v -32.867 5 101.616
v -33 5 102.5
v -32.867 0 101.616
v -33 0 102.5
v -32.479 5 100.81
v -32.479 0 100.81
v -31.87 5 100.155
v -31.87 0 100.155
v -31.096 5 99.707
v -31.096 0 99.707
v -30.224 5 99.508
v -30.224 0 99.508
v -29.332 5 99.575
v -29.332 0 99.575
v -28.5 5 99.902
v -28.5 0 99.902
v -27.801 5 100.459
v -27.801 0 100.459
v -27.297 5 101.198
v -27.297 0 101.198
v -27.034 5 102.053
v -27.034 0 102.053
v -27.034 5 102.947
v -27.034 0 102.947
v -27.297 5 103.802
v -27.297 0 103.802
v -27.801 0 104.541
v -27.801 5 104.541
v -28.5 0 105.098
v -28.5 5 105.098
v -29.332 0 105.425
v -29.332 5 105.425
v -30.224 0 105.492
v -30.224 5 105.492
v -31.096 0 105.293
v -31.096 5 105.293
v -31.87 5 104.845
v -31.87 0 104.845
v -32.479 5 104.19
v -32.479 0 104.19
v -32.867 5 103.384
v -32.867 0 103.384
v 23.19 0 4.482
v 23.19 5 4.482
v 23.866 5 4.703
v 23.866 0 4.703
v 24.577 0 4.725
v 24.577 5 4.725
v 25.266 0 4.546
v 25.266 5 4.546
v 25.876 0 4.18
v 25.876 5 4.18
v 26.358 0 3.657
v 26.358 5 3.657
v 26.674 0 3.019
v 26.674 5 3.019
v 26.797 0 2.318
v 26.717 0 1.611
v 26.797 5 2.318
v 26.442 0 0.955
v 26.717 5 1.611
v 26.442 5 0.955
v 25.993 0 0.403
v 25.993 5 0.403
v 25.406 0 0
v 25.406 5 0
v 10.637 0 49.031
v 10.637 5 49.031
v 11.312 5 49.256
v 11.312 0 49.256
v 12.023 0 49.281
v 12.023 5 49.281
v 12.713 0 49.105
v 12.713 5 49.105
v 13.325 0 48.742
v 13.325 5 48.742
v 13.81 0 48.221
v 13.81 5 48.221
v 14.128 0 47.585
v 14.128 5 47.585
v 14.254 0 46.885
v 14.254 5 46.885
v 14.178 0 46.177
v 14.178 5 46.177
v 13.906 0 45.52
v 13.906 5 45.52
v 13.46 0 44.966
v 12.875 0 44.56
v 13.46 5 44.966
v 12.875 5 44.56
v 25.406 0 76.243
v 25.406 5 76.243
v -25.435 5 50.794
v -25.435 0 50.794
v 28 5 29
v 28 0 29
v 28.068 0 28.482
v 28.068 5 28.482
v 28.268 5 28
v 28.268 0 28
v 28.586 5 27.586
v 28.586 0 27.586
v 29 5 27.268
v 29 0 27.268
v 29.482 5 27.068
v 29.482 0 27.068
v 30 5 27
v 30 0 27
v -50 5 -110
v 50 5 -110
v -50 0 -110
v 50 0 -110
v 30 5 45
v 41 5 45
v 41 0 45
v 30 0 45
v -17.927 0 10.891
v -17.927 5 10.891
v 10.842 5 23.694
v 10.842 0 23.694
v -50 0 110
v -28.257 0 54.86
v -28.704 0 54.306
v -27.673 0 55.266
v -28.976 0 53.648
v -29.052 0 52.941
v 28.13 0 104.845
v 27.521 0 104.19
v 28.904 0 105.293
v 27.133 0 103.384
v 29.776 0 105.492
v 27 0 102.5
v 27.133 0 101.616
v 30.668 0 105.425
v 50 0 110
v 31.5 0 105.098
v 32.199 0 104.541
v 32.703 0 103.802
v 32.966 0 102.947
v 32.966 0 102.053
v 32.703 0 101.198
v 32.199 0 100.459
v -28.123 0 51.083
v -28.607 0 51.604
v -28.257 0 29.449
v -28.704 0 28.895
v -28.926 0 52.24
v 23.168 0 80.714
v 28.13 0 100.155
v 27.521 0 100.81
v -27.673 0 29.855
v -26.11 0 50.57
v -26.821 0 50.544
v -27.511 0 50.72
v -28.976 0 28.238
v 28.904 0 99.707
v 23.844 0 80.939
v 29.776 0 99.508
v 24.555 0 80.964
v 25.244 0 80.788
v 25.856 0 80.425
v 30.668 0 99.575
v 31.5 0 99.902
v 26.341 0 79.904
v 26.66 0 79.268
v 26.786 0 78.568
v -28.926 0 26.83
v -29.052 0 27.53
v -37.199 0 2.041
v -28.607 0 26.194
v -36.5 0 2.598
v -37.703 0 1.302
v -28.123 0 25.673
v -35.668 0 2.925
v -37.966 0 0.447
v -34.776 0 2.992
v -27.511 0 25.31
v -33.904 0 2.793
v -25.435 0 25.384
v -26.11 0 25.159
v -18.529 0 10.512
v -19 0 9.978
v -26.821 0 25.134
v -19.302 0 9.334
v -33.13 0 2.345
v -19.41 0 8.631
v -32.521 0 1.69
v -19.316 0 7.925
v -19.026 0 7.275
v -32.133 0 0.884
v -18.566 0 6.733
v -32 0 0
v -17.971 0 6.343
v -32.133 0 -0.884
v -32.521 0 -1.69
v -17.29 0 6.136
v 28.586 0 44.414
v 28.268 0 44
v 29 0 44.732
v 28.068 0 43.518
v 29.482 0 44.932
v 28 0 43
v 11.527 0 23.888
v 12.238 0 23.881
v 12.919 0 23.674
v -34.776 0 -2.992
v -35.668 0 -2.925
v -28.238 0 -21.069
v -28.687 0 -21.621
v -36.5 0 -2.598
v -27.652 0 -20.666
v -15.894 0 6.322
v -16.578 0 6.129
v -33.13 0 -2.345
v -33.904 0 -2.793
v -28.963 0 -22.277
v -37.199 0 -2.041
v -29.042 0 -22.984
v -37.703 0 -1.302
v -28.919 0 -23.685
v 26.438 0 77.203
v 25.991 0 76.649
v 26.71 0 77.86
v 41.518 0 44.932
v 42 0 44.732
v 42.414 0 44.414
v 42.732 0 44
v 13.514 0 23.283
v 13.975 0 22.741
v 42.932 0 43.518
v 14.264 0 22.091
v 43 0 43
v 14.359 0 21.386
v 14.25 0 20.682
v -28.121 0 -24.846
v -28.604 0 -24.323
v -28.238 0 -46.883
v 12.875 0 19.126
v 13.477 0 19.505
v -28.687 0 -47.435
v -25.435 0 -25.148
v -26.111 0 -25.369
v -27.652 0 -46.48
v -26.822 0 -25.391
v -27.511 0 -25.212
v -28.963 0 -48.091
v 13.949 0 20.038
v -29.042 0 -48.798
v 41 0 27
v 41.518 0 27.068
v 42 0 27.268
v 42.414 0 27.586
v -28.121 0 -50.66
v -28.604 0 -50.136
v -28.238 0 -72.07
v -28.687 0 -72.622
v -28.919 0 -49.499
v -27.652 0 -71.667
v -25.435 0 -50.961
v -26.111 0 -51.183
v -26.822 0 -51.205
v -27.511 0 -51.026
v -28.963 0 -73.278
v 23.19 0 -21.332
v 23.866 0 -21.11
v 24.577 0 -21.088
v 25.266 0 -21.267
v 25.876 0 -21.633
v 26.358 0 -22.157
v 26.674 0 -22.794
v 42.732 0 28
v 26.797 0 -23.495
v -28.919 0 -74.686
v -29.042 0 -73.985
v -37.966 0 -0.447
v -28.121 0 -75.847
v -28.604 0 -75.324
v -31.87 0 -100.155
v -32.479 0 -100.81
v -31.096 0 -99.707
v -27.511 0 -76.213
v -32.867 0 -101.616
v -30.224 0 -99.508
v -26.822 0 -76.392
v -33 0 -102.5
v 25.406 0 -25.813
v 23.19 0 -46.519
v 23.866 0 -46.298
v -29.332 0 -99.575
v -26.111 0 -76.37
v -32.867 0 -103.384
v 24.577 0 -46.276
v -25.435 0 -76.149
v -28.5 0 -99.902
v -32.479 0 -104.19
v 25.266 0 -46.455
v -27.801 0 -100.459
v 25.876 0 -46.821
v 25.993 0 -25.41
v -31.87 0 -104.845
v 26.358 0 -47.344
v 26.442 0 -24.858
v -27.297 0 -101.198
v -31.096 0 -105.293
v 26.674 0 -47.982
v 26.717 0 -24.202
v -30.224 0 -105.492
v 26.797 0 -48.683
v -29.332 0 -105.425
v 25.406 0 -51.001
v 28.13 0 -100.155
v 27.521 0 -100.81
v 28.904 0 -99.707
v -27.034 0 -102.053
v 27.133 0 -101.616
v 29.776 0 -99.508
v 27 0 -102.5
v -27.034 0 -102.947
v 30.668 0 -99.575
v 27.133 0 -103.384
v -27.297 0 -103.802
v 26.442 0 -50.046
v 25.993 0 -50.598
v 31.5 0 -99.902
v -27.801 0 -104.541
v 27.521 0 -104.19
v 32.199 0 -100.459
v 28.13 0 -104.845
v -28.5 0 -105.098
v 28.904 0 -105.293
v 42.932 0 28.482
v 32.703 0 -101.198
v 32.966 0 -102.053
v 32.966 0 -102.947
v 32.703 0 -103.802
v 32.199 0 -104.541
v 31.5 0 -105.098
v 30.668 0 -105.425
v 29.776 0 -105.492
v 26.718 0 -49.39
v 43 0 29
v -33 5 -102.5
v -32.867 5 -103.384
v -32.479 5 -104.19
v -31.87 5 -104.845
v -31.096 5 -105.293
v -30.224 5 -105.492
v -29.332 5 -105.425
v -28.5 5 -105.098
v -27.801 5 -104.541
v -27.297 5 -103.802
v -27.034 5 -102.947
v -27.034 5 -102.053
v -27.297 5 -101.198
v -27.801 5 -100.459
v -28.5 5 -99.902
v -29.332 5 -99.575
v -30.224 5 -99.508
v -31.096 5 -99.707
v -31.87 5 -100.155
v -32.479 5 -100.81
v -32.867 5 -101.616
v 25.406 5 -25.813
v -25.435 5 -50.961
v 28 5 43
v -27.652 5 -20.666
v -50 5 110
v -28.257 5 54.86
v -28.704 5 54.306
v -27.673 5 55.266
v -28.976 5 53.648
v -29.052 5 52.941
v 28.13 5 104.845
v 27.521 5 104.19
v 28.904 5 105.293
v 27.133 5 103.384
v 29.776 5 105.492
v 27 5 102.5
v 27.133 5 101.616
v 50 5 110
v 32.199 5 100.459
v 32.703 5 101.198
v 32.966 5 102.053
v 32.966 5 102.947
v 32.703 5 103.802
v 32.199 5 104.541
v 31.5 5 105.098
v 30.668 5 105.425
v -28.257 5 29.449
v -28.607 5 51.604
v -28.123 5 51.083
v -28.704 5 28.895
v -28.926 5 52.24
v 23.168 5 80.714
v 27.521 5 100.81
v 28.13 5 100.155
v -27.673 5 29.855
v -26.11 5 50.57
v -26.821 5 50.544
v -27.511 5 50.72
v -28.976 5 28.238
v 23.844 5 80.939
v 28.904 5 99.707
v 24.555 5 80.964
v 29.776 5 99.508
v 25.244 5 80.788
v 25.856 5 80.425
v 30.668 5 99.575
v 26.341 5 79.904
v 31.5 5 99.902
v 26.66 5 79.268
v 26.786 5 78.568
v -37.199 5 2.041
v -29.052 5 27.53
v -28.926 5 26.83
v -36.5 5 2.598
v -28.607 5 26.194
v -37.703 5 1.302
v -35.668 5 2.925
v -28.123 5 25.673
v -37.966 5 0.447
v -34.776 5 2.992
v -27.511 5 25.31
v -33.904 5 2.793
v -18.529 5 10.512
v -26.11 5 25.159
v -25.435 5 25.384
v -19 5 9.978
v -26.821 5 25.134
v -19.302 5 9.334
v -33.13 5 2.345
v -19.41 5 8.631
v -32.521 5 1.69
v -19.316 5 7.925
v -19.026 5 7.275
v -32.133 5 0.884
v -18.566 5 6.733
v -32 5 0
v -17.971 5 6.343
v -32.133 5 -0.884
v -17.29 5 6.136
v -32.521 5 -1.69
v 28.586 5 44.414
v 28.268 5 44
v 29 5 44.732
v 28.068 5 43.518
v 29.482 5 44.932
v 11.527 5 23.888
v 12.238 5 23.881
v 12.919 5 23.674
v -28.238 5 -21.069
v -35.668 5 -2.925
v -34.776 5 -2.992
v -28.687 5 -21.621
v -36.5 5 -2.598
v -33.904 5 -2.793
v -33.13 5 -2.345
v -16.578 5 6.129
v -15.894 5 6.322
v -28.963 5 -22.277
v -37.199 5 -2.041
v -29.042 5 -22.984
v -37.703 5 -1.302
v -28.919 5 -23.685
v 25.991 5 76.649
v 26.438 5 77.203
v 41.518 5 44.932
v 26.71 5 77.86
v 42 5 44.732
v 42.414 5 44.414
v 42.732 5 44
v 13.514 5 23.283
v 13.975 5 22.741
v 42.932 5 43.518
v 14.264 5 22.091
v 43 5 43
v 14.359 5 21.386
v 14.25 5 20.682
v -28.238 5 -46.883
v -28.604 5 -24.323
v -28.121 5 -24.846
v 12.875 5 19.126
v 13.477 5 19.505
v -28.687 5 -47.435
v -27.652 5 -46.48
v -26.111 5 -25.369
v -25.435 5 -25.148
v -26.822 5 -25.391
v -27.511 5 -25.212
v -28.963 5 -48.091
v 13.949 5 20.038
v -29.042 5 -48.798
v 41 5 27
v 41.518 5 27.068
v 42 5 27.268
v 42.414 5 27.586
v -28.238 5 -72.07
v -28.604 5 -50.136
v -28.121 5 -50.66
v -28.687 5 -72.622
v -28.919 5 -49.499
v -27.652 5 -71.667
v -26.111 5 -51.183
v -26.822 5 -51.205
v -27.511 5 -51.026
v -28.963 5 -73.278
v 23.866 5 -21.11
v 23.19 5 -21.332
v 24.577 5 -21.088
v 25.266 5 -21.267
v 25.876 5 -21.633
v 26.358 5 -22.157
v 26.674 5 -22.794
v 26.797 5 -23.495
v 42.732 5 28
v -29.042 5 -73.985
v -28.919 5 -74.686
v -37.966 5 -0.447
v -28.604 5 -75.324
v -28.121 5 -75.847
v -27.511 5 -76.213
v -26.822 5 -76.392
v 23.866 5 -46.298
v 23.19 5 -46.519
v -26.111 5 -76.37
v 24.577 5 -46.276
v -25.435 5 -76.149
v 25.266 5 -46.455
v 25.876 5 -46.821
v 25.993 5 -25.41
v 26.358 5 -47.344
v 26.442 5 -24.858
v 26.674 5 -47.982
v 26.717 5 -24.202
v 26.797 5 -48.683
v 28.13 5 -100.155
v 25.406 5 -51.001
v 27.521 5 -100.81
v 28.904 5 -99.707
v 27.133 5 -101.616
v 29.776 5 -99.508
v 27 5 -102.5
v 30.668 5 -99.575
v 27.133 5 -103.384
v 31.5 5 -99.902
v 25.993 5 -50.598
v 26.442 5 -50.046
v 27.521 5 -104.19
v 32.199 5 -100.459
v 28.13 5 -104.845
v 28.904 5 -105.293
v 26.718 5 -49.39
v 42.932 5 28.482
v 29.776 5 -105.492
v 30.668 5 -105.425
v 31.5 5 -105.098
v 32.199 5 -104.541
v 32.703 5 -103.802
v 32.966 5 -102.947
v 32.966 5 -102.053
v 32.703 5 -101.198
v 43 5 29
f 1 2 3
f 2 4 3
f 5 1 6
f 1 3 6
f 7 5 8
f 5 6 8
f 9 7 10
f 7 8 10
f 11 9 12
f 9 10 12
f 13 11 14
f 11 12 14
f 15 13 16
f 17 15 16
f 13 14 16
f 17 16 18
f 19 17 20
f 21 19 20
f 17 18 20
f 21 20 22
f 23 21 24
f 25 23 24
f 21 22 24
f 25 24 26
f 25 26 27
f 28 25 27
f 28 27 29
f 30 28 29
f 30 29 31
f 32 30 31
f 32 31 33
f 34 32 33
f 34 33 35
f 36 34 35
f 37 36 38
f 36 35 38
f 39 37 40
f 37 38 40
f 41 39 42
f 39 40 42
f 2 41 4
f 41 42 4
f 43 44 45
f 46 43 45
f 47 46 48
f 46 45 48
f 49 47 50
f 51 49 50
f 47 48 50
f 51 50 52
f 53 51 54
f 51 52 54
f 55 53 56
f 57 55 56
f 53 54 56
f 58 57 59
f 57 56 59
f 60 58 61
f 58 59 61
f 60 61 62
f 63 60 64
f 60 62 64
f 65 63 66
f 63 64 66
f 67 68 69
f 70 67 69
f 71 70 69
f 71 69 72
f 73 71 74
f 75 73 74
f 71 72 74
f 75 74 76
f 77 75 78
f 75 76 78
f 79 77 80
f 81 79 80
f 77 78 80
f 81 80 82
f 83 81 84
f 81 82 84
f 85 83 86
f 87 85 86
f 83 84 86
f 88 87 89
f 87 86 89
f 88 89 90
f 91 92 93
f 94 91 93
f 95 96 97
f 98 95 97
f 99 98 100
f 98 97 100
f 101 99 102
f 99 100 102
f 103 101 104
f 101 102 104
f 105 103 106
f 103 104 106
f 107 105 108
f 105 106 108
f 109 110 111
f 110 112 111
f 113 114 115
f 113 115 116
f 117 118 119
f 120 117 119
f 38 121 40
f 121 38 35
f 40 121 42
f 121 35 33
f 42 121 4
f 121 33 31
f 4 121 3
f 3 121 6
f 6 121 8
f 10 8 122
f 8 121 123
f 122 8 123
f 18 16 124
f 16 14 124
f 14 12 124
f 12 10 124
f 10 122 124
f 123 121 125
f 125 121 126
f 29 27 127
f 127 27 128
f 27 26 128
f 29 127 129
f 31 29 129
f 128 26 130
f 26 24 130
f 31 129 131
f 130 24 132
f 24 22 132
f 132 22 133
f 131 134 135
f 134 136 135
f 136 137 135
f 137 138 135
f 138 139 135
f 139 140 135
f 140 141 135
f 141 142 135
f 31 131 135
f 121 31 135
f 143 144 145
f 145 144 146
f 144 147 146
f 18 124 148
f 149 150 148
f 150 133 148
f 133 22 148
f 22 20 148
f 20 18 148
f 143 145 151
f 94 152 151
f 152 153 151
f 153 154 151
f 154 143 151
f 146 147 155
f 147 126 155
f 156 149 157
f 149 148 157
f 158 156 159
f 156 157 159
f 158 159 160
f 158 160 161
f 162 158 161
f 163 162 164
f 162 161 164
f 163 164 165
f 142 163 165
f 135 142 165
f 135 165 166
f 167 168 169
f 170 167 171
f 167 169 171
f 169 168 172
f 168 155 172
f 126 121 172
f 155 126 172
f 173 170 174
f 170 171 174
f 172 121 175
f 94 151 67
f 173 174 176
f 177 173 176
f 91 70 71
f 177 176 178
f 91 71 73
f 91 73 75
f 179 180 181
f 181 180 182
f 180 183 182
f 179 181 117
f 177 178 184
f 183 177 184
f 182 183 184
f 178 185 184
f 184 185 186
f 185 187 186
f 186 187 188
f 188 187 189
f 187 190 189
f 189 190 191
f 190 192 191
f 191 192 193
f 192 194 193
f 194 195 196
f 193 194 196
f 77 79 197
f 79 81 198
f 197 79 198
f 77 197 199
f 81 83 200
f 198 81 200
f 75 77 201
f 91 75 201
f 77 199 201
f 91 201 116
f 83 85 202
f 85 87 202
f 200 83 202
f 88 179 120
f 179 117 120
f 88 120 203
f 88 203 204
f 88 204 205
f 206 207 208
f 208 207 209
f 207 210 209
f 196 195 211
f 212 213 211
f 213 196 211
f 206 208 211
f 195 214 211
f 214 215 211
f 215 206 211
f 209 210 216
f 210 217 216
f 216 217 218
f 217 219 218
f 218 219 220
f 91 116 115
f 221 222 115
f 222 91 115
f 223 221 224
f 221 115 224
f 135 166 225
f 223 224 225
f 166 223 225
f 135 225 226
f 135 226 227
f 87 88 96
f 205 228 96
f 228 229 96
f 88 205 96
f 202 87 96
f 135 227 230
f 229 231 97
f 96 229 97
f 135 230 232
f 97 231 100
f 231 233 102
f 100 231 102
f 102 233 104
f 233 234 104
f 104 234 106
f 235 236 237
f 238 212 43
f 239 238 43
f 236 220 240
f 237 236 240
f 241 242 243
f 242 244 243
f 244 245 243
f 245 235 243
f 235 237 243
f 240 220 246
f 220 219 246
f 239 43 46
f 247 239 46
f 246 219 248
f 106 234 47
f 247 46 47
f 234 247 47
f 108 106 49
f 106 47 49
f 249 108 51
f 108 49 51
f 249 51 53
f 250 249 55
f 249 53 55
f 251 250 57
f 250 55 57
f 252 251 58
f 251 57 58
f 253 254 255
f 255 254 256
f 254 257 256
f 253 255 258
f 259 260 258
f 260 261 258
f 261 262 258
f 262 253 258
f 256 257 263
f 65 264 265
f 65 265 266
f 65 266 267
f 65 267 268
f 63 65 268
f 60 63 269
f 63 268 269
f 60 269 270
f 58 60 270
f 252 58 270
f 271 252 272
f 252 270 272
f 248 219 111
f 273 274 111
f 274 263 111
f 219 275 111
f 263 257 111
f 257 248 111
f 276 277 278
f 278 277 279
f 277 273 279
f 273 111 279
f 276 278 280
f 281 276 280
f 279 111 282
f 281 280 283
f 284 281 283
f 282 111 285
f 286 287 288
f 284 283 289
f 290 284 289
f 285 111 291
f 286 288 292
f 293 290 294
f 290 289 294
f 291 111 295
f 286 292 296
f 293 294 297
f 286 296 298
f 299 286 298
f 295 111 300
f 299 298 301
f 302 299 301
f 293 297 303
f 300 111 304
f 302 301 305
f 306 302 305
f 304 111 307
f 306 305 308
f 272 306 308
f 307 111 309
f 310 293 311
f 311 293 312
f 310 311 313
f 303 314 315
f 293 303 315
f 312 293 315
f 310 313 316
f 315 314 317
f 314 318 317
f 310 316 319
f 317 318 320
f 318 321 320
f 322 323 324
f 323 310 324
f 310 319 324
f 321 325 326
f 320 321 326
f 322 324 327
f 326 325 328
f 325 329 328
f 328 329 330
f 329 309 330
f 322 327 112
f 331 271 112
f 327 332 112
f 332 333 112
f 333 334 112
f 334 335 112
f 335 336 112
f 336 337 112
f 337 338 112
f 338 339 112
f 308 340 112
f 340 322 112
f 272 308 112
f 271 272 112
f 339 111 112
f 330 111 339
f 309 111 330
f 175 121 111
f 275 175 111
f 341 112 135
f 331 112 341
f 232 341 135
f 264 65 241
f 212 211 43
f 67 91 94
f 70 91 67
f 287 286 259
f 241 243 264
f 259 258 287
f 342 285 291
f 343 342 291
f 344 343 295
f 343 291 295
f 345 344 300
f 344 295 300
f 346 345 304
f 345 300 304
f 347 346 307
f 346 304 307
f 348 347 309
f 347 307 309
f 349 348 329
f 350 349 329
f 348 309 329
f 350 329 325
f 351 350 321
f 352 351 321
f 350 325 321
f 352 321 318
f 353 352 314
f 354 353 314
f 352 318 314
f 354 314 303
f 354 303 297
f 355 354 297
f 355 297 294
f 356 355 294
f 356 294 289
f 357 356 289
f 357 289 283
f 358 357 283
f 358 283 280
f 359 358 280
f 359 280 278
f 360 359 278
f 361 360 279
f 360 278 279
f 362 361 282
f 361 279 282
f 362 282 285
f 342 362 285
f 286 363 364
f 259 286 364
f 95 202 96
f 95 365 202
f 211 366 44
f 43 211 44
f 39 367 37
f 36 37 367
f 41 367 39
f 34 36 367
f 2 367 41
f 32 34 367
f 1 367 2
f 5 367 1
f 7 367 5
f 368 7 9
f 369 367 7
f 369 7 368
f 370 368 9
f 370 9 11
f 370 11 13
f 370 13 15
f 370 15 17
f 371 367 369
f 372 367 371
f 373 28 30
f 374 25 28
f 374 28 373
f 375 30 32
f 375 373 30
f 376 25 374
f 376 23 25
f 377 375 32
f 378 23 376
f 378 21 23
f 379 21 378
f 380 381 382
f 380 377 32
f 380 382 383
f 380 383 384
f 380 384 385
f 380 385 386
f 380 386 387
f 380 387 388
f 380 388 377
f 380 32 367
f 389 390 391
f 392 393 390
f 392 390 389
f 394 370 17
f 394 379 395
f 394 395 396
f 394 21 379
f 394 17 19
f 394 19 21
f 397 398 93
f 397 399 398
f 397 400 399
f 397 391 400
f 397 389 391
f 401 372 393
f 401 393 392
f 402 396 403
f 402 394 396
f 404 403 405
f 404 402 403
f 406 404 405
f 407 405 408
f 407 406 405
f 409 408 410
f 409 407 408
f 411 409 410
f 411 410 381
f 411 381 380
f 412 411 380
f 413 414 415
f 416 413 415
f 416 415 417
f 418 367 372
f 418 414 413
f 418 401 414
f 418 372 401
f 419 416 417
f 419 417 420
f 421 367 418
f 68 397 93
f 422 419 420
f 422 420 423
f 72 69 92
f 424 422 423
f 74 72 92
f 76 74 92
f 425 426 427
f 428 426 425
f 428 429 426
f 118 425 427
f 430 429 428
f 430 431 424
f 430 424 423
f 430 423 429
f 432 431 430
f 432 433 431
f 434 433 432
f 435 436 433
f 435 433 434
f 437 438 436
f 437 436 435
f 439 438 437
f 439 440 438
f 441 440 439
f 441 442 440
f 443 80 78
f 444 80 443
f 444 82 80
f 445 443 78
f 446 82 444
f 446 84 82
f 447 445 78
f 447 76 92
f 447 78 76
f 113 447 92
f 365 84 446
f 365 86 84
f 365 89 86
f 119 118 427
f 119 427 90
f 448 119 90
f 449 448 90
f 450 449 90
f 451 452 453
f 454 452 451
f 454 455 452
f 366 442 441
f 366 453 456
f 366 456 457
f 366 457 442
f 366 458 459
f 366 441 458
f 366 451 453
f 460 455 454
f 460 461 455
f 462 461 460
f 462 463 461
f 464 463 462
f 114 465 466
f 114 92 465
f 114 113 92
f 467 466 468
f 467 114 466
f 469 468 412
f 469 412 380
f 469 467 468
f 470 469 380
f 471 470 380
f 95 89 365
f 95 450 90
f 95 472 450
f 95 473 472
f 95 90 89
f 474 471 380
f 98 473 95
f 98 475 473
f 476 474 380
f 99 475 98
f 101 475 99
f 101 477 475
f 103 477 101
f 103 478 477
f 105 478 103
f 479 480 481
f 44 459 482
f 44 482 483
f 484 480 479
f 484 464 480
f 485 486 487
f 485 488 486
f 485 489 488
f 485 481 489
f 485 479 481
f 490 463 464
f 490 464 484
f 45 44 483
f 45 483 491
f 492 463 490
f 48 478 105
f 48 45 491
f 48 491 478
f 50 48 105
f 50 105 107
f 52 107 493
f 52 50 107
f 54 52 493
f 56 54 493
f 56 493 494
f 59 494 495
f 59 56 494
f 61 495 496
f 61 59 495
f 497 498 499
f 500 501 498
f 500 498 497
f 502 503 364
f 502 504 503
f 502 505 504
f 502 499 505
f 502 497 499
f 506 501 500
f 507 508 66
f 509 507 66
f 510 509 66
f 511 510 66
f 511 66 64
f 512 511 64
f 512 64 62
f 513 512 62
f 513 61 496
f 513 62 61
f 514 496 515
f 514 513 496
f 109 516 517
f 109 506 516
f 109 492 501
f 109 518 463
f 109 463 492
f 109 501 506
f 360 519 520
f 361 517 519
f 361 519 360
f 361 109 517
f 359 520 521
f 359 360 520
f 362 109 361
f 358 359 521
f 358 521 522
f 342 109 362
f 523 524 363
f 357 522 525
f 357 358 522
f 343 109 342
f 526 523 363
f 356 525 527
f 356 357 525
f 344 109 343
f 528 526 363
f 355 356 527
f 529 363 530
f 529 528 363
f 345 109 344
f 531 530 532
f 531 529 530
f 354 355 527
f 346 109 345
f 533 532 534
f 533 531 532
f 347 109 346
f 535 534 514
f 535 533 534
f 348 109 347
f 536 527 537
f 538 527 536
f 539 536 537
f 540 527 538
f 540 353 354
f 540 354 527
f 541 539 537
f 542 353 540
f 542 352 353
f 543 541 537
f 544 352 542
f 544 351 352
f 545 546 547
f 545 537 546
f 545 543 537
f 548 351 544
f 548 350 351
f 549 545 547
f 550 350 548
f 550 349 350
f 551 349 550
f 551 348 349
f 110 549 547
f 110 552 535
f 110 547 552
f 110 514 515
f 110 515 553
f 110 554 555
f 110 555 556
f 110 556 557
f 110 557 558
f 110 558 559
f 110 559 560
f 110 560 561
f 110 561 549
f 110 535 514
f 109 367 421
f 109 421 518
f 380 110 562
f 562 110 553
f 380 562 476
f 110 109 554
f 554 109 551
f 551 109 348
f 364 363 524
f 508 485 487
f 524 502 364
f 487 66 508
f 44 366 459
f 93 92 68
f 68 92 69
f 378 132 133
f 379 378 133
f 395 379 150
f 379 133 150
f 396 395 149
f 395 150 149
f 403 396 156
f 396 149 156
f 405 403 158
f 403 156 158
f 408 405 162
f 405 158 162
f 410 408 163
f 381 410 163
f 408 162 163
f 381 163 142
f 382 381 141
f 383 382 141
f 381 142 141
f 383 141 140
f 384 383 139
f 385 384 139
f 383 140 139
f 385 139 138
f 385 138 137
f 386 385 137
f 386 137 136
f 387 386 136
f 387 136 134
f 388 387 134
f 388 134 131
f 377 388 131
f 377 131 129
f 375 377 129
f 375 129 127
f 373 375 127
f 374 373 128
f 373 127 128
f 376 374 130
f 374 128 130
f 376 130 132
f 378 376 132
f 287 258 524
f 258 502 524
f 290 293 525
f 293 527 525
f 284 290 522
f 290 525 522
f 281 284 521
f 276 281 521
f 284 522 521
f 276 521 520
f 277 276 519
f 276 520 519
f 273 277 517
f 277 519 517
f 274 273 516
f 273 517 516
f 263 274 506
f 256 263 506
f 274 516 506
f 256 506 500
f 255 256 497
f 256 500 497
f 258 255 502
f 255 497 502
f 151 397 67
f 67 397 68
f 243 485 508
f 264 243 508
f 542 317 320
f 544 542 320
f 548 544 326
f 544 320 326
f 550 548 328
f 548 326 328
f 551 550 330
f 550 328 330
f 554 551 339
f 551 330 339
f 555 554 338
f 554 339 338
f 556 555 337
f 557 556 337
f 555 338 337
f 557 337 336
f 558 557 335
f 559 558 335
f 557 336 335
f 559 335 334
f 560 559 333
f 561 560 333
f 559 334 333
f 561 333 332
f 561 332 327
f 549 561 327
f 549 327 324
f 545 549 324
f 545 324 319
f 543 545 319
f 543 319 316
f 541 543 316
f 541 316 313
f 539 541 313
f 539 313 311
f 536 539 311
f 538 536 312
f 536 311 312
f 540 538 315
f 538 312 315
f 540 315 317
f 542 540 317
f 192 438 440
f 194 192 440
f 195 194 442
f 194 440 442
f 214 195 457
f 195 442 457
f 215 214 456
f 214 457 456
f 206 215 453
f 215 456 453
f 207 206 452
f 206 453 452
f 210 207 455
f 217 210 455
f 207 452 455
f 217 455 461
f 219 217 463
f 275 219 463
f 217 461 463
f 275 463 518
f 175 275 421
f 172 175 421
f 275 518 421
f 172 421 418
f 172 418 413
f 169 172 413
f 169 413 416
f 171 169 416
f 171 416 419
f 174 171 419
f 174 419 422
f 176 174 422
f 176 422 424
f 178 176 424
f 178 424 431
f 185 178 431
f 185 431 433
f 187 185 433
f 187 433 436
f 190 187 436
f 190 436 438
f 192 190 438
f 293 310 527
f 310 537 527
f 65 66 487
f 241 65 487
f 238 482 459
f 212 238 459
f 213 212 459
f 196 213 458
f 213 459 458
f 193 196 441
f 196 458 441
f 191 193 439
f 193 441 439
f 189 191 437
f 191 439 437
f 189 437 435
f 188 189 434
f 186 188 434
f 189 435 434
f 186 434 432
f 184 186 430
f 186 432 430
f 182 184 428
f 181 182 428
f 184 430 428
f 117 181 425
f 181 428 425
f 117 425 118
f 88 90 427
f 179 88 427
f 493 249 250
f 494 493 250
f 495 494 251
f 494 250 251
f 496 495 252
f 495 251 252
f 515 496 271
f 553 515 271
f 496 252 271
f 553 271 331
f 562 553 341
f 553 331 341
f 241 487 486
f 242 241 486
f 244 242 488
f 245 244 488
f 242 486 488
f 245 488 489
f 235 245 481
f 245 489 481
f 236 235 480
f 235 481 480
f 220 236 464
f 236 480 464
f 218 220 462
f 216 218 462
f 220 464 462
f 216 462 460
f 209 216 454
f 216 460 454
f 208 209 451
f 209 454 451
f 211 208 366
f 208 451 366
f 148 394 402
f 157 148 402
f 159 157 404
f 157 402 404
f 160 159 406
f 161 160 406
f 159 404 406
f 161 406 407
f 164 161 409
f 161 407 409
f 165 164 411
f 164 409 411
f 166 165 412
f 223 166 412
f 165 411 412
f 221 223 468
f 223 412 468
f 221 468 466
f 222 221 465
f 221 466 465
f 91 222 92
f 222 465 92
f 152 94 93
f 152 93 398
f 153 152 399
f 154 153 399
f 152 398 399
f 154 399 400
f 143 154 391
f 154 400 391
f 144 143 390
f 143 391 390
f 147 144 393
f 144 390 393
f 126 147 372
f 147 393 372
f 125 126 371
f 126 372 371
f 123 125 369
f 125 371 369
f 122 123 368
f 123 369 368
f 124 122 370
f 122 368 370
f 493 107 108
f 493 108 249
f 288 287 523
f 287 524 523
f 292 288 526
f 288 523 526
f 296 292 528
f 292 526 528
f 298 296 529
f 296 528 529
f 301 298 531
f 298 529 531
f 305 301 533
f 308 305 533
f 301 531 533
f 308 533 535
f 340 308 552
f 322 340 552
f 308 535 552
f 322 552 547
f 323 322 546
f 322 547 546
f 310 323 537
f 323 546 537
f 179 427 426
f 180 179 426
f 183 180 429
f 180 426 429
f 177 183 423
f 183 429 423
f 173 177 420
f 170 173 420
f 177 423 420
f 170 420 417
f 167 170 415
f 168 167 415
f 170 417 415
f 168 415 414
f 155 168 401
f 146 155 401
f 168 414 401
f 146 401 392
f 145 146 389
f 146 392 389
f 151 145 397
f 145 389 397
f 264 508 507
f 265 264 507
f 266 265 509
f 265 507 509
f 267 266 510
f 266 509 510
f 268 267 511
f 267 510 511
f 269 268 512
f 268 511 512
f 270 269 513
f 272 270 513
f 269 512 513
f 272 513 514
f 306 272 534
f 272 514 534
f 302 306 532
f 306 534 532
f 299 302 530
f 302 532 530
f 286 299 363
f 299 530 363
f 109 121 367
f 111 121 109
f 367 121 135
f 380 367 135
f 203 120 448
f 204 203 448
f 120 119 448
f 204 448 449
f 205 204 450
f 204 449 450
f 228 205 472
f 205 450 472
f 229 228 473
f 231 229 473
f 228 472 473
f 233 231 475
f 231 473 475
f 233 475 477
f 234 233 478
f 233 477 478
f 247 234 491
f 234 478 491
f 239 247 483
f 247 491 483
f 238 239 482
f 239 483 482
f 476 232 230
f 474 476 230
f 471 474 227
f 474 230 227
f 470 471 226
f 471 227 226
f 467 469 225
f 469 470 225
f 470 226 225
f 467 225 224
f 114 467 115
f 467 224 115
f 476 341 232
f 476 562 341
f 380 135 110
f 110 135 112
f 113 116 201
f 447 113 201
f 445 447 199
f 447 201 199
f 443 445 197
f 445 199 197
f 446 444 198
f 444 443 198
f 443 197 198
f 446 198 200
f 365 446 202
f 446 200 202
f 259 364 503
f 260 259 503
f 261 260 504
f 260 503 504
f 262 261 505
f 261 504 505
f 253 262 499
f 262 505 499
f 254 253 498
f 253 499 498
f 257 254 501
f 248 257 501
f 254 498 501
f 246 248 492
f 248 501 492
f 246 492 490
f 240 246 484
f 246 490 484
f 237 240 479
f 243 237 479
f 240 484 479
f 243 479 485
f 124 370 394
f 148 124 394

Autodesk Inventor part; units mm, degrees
ref_plane "YZ Plane" through (0, 0, 0) normal (1, 0, 0) x (0, 1, 0)
ref_plane "XZ Plane" through (0, 0, 0) normal (0, 1, 0) x (-1, 0, 0)
ref_plane "XY Plane" through (0, 0, 0) normal (0, 0, 1) x (1, 0, 0)
sketch "Sketch1" plane through (0, 0, 0) normal (0, 1, 0) x (-1, 0, 0)
  line L0 (0, 0) -> (0, 110)
  line L1 (0, 110) -> (50, 110)
  line L2 (50, 110) -> (50, -110)
  line L3 (50, -110) -> (0, -110)
  line L4 (0, -110) -> (0, 0)
  line L5 (50, 0) -> (0, 0)
  line L6 (50, 110) -> (50, 102.5)
  line L7 (50, 102.5) -> (30, 102.5)
  line L8 (0, 110) -> (-50, 110)
  line L9 (-50, 110) -> (-50, -110)
  line L10 (-50, -110) -> (0, -110)
  circle A0 centre (30, 102.5) radius 3
  line L11 (30, 102.5) -> (-30, 102.5)
  circle A1 centre (-30, 102.5) radius 3
  circle A2 centre (30, -102.5) radius 3
  circle A3 centre (-30, -102.5) radius 3
  line L12 (30, 102.5) -> (30, -102.5)
  line L13 (-30, 102.5) -> (-30, -102.5)
  line L14 (30, 76.2) -> (-30, 50.8) construction
  line L15 (28.0508, 80.8044) -> (-31.9492, 55.4044)
  line L16 (-28.0508, 46.1956) -> (31.9492, 71.5956)
  arc A4 (31.9492, 71.5956) -> (28.0508, 80.8044) centre (30, 76.2) ccw
  arc A5 (-31.9492, 55.4044) -> (-28.0508, 46.1956) centre (-30, 50.8) ccw
  line L17 (30, 50.8) -> (-30, 25.4) construction
  line L18 (28.0508, 55.4044) -> (-31.9492, 30.0044)
  line L19 (-28.0508, 20.7956) -> (31.9492, 46.1956)
  arc A6 (31.9492, 46.1956) -> (28.0508, 55.4044) centre (30, 50.8) ccw
  arc A7 (-31.9492, 30.0044) -> (-28.0508, 20.7956) centre (-30, 25.4) ccw
  line L20 (30, 25.4) -> (-30, 0) construction
  line L21 (28.0508, 30.0044) -> (-31.9492, 4.6044)
  line L22 (-28.0508, -4.6044) -> (31.9492, 20.7956)
  arc A8 (31.9492, 20.7956) -> (28.0508, 30.0044) centre (30, 25.4) ccw
  arc A9 (-31.9492, 4.6044) -> (-28.0508, -4.6044) centre (-30, 0) ccw
  line L23 (30, 0) -> (-30, -25.4) construction
  line L24 (28.0508, 4.6044) -> (-31.9492, -20.7956)
  line L25 (-28.0508, -30.0044) -> (31.9492, -4.6044)
  arc A10 (31.9492, -4.6044) -> (28.0508, 4.6044) centre (30, 0) ccw
  arc A11 (-31.9492, -20.7956) -> (-28.0508, -30.0044) centre (-30, -25.4) ccw
  line L26 (30, -25.4) -> (-30, -50.8) construction
  line L27 (28.0508, -20.7956) -> (-31.9492, -46.1956)
  line L28 (-28.0508, -55.4044) -> (31.9492, -30.0044)
  arc A12 (31.9492, -30.0044) -> (28.0508, -20.7956) centre (30, -25.4) ccw
  arc A13 (-31.9492, -46.1956) -> (-28.0508, -55.4044) centre (-30, -50.8) ccw
  line L29 (30, -50.8) -> (-30, -76.2) construction
  line L30 (28.0508, -46.1956) -> (-31.9492, -71.5956)
  line L31 (-28.0508, -80.8044) -> (31.9492, -55.4044)
  arc A14 (31.9492, -55.4044) -> (28.0508, -46.1956) centre (30, -50.8) ccw
  arc A15 (-31.9492, -71.5956) -> (-28.0508, -80.8044) centre (-30, -76.2) ccw
  point P0 (0, 63.5)
  point P1 (0, 38.1)
  point P2 (0, 12.7)
  point P3 (0, -12.7)
  point P4 (0, -38.1)
  point P5 (0, -63.5)
  dimension "d0" = 110
  dimension "d1" = 50
  dimension "d2" = 220
  dimension "d3" = 7.5
  dimension "d4" = 20
  dimension "d5" = 50
  dimension "d6" = 6
  dimension "d7" = 60
  dimension "d8" = 6
  dimension "d9" = 10
  dimension "d10" = 10
  dimension "d11" = 10
  dimension "d12" = 10
  dimension "d13" = 10
  dimension "d14" = 10
extrude "Extrusion1" add sketch "Sketch1" along normal blind 5 contours L4 L24 L13 A9 L22 L0 | L5 L24 L4 | L0 L22 L12 A10 L24 L5 | L21 L13 A7 L19 L0 | L0 L19 L12 A8 L21 | L22 A8 L12 L19 A6 L16 A4 A0 L7 L2 L5 A10 | L25 L12 A12 L27 L4 | L4 L27 L13 A11 L25 | L24 A11 L13 L27 A13 L30 A15 L31 L4 L10 L9 L8 L0 L11 A1 L15 A5 L18 A7 L21 A9 | L25 A10 L5 L2 L3 L4 L31 A14 L12 L28 A12 | L18 L13 A5 L16 L0 | L0 L16 L12 A6 L18 | L28 L12 A14 L30 L4 | L4 L30 L13 A13 L28 | L7 A0 L11 L0 L1 L2 | L15 L13 A1 L11 L0 | L0 L11 A0 L12 A4 L15
sketch "Sketch2" plane through (0, 5, 0) normal (0, 1, 0) x (1, 0, 0)
  line L0 (31.9492, -55.4044) -> (-28.0508, -80.8044) projected
  line L1 (-28.0508, -80.8044) -> (31.9492, -55.4044)
  line L2 (-31.9492, -71.5956) -> (28.0508, -46.1956) projected
  line L3 (-31.9492, -71.5956) -> (28.0508, -46.1956)
  arc A0 (31.9492, -55.4044) -> (28.0508, -46.1956) centre (30, -50.8) ccw projected
  arc A1 (31.9492, -55.4044) -> (28.0508, -46.1956) centre (30, -50.8) ccw
  arc A2 (-31.9492, -71.5956) -> (-28.0508, -80.8044) centre (-30, -76.2) ccw projected
  arc A3 (-31.9492, -71.5956) -> (-28.0508, -80.8044) centre (-30, -76.2) ccw
  arc A4 (-31.9492, -46.1956) -> (-28.0508, -55.4044) centre (-30, -50.8) ccw projected
  arc A5 (-31.9492, -46.1956) -> (-28.0508, -55.4044) centre (-30, -50.8) ccw
  arc A6 (31.9492, -30.0044) -> (28.0508, -20.7956) centre (30, -25.4) ccw projected
  arc A7 (31.9492, -30.0044) -> (28.0508, -20.7956) centre (30, -25.4) ccw
  line L4 (31.9492, -30.0044) -> (-28.0508, -55.4044)
  line L5 (-31.9492, -46.1956) -> (28.0508, -20.7956)
  point P0 (0, 0)
extrude "Extrusion2" add sketch "Sketch2" against normal blind 5
sketch "Sketch3" plane through (0, 5, 0) normal (0, 1, 0) x (1, 0, 0)
  line L0 (50, -110) -> (50, 110) projected
  line L1 (-50, -110) -> (50, -110) projected
  line L2 (50, -110) -> (-50, -110)
  line L3 (50, -110) -> (25, -110)
  line L4 (25, -110) -> (25, -50)
  line L5 (25, -50) -> (17.5, -50)
  line L6 (17.5, -50) -> (17.5, -35)
  line L7 (17.5, -35) -> (32.5, -35)
  line L8 (32.5, -35) -> (32.5, -50)
  line L9 (32.5, -50) -> (25, -50)
  line L10 (-25.409, -50.782) -> (-0.009, -38.082) construction
  line L11 (-23.1729, -55.2541) -> (2.2271, -42.5541)
  line L12 (-2.2451, -33.6099) -> (-27.6451, -46.3099)
  arc A0 (-27.6451, -46.3099) -> (-23.1729, -55.2541) centre (-25.409, -50.782) ccw
  arc A1 (2.2271, -42.5541) -> (-2.2451, -33.6099) centre (-0.009, -38.082) ccw
  line L13 (-25.409, -76.2) -> (-0.009, -63.5) construction
  line L14 (-23.1729, -80.6721) -> (2.2271, -67.9721)
  line L15 (-2.2451, -59.0279) -> (-27.6451, -71.7279)
  arc A2 (-27.6451, -71.7279) -> (-23.1729, -80.6721) centre (-25.409, -76.2) ccw
  arc A3 (2.2271, -67.9721) -> (-2.2451, -59.0279) centre (-0.009, -63.5) ccw
  point P0 (0, 0)
  point P1 (-12.709, -44.432)
  point P2 (-12.709, -69.85)
  dimension "d19" = 25
  dimension "d20" = 60
  dimension "d21" = 7.5
  dimension "d22" = 15
  dimension "d23" = 15
  dimension "d24" = 10
  dimension "d25" = 10
extrude "Extrusion3" cut sketch "Sketch3" against normal blind 5
fillet "Face Fillet1" radius 2 1 edges at (17.5, 2.5, 50)
fillet "Face Fillet2" radius 2 1 edges at (32.5, 2.5, 50)
fillet "Face Fillet3" radius 2 1 edges at (17.5, 2.5, 35)
fillet "Face Fillet4" radius 2 1 edges at (32.5, 2.5, 35)
sketch "Sketch4" plane through (0, 5, 0) normal (0, 1, 0) x (1, 0, 0)
  line L0 (-31.9492, 4.6044) -> (28.0508, 30.0044) projected
  line L1 (-31.9492, 4.6044) -> (28.0508, 30.0044)
  line L2 (31.9492, 20.7956) -> (-28.0508, -4.6044) projected
  line L3 (31.9492, 20.7956) -> (-28.0508, -4.6044)
  arc A0 (-31.9492, 4.6044) -> (-28.0508, -4.6044) centre (-30, 0) ccw
  arc A1 (31.9492, 20.7956) -> (28.0508, 30.0044) centre (30, 25.4) ccw projected
  arc A2 (31.9492, 20.7956) -> (28.0508, 30.0044) centre (30, 25.4) ccw
  point P0 (0, 0)
extrude "Extrusion4" add sketch "Sketch4" against normal blind 5
sketch "Sketch5" plane through (0, 5, 0) normal (0, 1, 0) x (1, 0, 0)
  line L0 (-50, 110) -> (-50, -110) projected
  line L1 (-50, -110) -> (-50, 0)
  line L2 (-50, 0) -> (-35, 0)
  circle A0 centre (-35, 0) radius 3
  line L3 (25.3921, 25.4185) -> (-19.0579, 6.3685) construction
  line L4 (23.4225, 30.0142) -> (-21.0275, 10.9642)
  line L5 (-17.0883, 1.7728) -> (27.3617, 20.8228)
  arc A1 (27.3617, 20.8228) -> (23.4225, 30.0142) centre (25.3921, 25.4185) ccw
  arc A2 (-21.0275, 10.9642) -> (-17.0883, 1.7728) centre (-19.0579, 6.3685) ccw
  point P0 (0, 0)
  point P1 (3.1671, 15.8935)
  dimension "d34" = 15
  dimension "d35" = 6
  dimension "d36" = 10
extrude "Extrusion5" cut sketch "Sketch5" against normal blind 5
sketch "Sketch6" plane through (0, 5, 0) normal (0, 1, 0) x (1, 0, 0)
  circle A0 centre (30, -102.5) radius 3 projected
  line L0 (30, -102.5) -> (30, -95)
  line L1 (30, -95) -> (30, -42)
  line L2 (30, -42) -> (40, -42)
  line L3 (40, -42) -> (25, -42)
  line L4 (25, -42) -> (25, -27)
  line L5 (25, -27) -> (40, -27)
  line L6 (40, -27) -> (40, -42)
  line L7 (32.5, -48) -> (32.5, -42)
  line L8 (32.5, -37) -> (32.5, -48) projected
  line L9 (19.5, -35) -> (30.5, -35) projected
  line L10 (25, -35) -> (19.5, -35)
  line L11 (30.5, -50) -> (19.5, -50)
  line L12 (17.5, -48) -> (17.5, -37)
  arc A1 (19.5, -35) -> (17.5, -37) centre (19.5, -37) ccw projected
  arc A2 (17.5, -48) -> (19.5, -50) centre (19.5, -48) ccw projected
  arc A3 (17.5, -48) -> (19.5, -50) centre (19.5, -48) ccw
  arc A4 (19.5, -35) -> (17.5, -37) centre (19.5, -37) ccw
  arc A5 (30.5, -50) -> (32.5, -48) centre (30.5, -48) ccw projected
  arc A6 (30.5, -50) -> (32.5, -48) centre (30.5, -48) ccw
  line L13 (40, -27) -> (43, -27)
  line L14 (43, -27) -> (43, -45)
  line L15 (43, -45) -> (25, -45)
  line L16 (25, -45) -> (25, -27)
  point P0 (0, 0)
  dimension "d39" = 7.5
  dimension "d40" = 53
  dimension "d41" = 10
  dimension "d42" = 15
  dimension "d43" = 15
  dimension "d50" = 3
  dimension "d51" = 18
extrude "Extrusion6" cut sketch "Sketch6" against normal blind 5 contours L3 L4 L5 L6 L2
sketch "Sketch7" plane through (0, 5, 0) normal (0, 1, 0) x (1, 0, 0)
  line L0 (32.5, -42) -> (40, -42) projected
  line L1 (40, -42) -> (25, -42)
  line L2 (40, -27) -> (25, -27) projected
  line L3 (25, -42) -> (25, -27)
  line L4 (32.5, -42) -> (32.5, -48) projected
  line L5 (32.5, -42) -> (32.5, -48)
  line L6 (19.5, -35) -> (25, -35) projected
  line L7 (25, -35) -> (19.5, -35)
  arc A0 (19.5, -35) -> (17.5, -37) centre (19.5, -37) ccw projected
  line L8 (17.5, -37) -> (17.5, -48)
  line L9 (30.5, -50) -> (19.5, -50) projected
  line L10 (19.5, -50) -> (30.5, -50)
  arc A1 (17.5, -48) -> (19.5, -50) centre (19.5, -48) ccw projected
  arc A2 (17.5, -48) -> (19.5, -50) centre (19.5, -48) ccw
  arc A3 (19.5, -35) -> (17.5, -37) centre (19.5, -37) ccw
  arc A4 (30.5, -50) -> (32.5, -48) centre (30.5, -48) ccw
  point P0 (0, 0)
  dimension "d46" = 15
extrude "Extrusion7" add sketch "Sketch7" against normal blind 5
fillet "Fillet1" radius 2 4 edges at (25, 2.5, 42) (25, 2.5, 27) (40, 2.5, 42) (40, 2.5, 27)
sketch "Sketch8" plane through (0, 5, 0) normal (0, 1, 0) x (1, 0, 0)
  line L0 (40, -29) -> (40, -40) projected
  line L1 (40, -34.5) -> (43, -34.5)
  line L2 (38, -27) -> (27, -27) projected
  line L3 (32.5, -27) -> (49.9944, -27)
  line L4 (43, -34.5) -> (43, -27)
  line L5 (43, -27) -> (43, -45)
  line L6 (43, -45) -> (25, -45)
  line L7 (25, -45) -> (25, -27)
  line L8 (25, -27) -> (43, -27)
  line L9 (43, -45) -> (28, -45)
  line L10 (28, -45) -> (28, -27)
  point P0 (0, 0)
  dimension "d52" = 3
  dimension "d53" = 18
  dimension "d54" = 18
  dimension "d55" = 15
extrude "Extrusion8" cut sketch "Sketch8" against normal blind 10 contours L3 L4 L5 L6 L10 L2
sketch "Sketch9" plane through (0, 5, 0) normal (0, 1, 0) x (1, 0, 0)
  line L0 (27, -42) -> (28, -42) projected
  line L1 (28, -42) -> (28, -27)
  line L2 (43, -27) -> (27, -27) projected
  line L3 (28, -42) -> (28, -45) projected
  line L4 (28, -42) -> (27, -42)
  line L5 (28, -27) -> (27, -27)
  line L6 (25, -29) -> (25, -40) projected
  line L7 (25, -40) -> (25, -29)
  arc A0 (25, -40) -> (27, -42) centre (27, -40) ccw projected
  arc A1 (25, -40) -> (27, -42) centre (27, -40) ccw
  arc A2 (27, -27) -> (25, -29) centre (27, -29) ccw
  point P0 (0, 0)
extrude "Extrusion9" add sketch "Sketch9" against normal blind 5
fillet "Fillet2" radius 2 4 edges at (28, 2.5, 45) (28, 2.5, 27) (43, 2.5, 45) (43, 2.5, 27)
sketch "Sketch10" plane through (0, 5, 0) normal (0, 1, 0) x (1, 0, 0)
  arc A0 (2.2271, -67.9721) -> (-2.2451, -59.0279) centre (-0.009, -63.5) ccw projected
  line L0 (-23.1729, -55.2541) -> (2.2271, -42.5541) projected
  line L1 (-23.1729, -55.2541) -> (2.2271, -42.5541)
  line L2 (-2.2451, -33.6099) -> (-27.6451, -46.3099) projected
  line L3 (-27.6451, -46.3099) -> (-2.2451, -33.6099)
  line L4 (31.9492, -4.6044) -> (-28.0508, -30.0044) projected
  line L5 (-28.0508, -30.0044) -> (31.9492, -4.6044)
  line L6 (-31.9492, -20.7956) -> (28.0508, 4.6044) projected
  line L7 (-31.9492, -20.7956) -> (28.0508, 4.6044)
  line L8 (-17.0883, 1.7728) -> (27.3617, 20.8228) projected
  line L9 (-17.0883, 1.7728) -> (27.3617, 20.8228)
  line L10 (23.4225, 30.0142) -> (-21.0275, 10.9642) projected
  line L11 (-21.0275, 10.9642) -> (23.4225, 30.0142)
  line L12 (31.9492, 46.1956) -> (-28.0508, 20.7956) projected
  line L13 (-28.0508, 20.7956) -> (31.9492, 46.1956)
  line L14 (-31.9492, 30.0044) -> (28.0508, 55.4044) projected
  line L15 (-31.9492, 30.0044) -> (28.0508, 55.4044)
  line L16 (31.9492, 71.5956) -> (-28.0508, 46.1956) projected
  line L17 (-28.0508, 46.1956) -> (31.9492, 71.5956)
  line L18 (-31.9492, 55.4044) -> (28.0508, 80.8044) projected
  line L19 (-31.9492, 55.4044) -> (28.0508, 80.8044)
  arc A1 (2.2271, -67.9721) -> (-2.2451, -59.0279) centre (-0.009, -63.5) ccw
  arc A2 (-27.6451, -46.3099) -> (-23.1729, -55.2541) centre (-25.409, -50.782) ccw
  arc A3 (2.2271, -42.5541) -> (-2.2451, -33.6099) centre (-0.009, -38.082) ccw
  arc A4 (-31.9492, -20.7956) -> (-28.0508, -30.0044) centre (-30, -25.4) ccw
  arc A5 (31.9492, -4.6044) -> (28.0508, 4.6044) centre (30, 0) ccw
  arc A6 (-21.0275, 10.9642) -> (-17.0883, 1.7728) centre (-19.0579, 6.3685) ccw
  arc A7 (-27.6451, -71.7279) -> (-23.1729, -80.6721) centre (-25.409, -76.2) ccw projected
  arc A8 (-27.6451, -71.7279) -> (-23.1729, -80.6721) centre (-25.409, -76.2) ccw
  line L20 (-23.1729, -80.6721) -> (2.2271, -67.9721) projected
  line L21 (-23.1729, -80.6721) -> (2.2271, -67.9721)
  line L22 (-27.6451, -71.7279) -> (-2.2451, -59.0279)
  arc A9 (-27.6451, -46.3099) -> (-23.1729, -55.2541) centre (-25.409, -50.782) ccw
  arc A10 (-31.9492, 30.0044) -> (-28.0508, 20.7956) centre (-30, 25.4) ccw
  arc A11 (-31.9492, 55.4044) -> (-28.0508, 46.1956) centre (-30, 50.8) ccw projected
  arc A12 (-31.9492, 55.4044) -> (-28.0508, 46.1956) centre (-30, 50.8) ccw
  arc A13 (31.9492, 71.5956) -> (28.0508, 80.8044) centre (30, 76.2) ccw
  arc A14 (27.3617, 20.8228) -> (23.4225, 30.0142) centre (25.3921, 25.4185) ccw
  arc A15 (31.9492, 46.1956) -> (28.0508, 55.4044) centre (30, 50.8) ccw
  point P0 (0, 0)
extrude "Extrusion10" add sketch "Sketch10" against normal blind 5
sketch "Sketch11" plane through (0, 5, 0) normal (0, 1, 0) x (1, 0, 0)
  line L0 (-26.5539, -53.0299) -> (24.2875, -78.4785) construction
  line L1 (-27.6729, -55.2655) -> (23.1685, -80.7141)
  line L2 (25.4065, -76.2429) -> (-25.4349, -50.7944)
  arc A0 (-25.4349, -50.7944) -> (-27.6729, -55.2655) centre (-26.5539, -53.0299) ccw
  arc A1 (23.1685, -80.7141) -> (25.4065, -76.2429) centre (24.2875, -78.4785) ccw
  line L3 (-26.5539, -27.6193) -> (11.7561, -46.7953) construction
  line L4 (-27.6729, -29.8549) -> (10.6371, -49.0309)
  line L5 (12.8751, -44.5598) -> (-25.4349, -25.3837)
  arc A2 (-25.4349, -25.3837) -> (-27.6729, -29.8549) centre (-26.5539, -27.6193) ccw
  arc A3 (10.6371, -49.0309) -> (12.8751, -44.5598) centre (11.7561, -46.7953) ccw
  line L6 (-16.9103, -8.6065) -> (11.8587, -21.41) construction
  line L7 (-17.9268, -10.8906) -> (10.8422, -23.694)
  line L8 (12.8751, -19.1259) -> (-15.8938, -6.3225)
  arc A4 (-15.8938, -6.3225) -> (-17.9268, -10.8906) centre (-16.9103, -8.6065) ccw
  arc A5 (10.8422, -23.694) -> (12.8751, -19.1259) centre (11.8587, -21.41) ccw
  line L9 (-26.5433, 22.907) -> (24.2981, -2.2409) construction
  line L10 (-27.6517, 20.6662) -> (23.1897, -4.4817)
  line L11 (25.4065, 0) -> (-25.4349, 25.1479)
  arc A6 (-25.4349, 25.1479) -> (-27.6517, 20.6662) centre (-26.5433, 22.907) ccw
  arc A7 (23.1897, -4.4817) -> (25.4065, 0) centre (24.2981, -2.2409) ccw
  line L12 (-26.5433, 48.7204) -> (24.2981, 23.5725) construction
  line L13 (-27.6517, 46.4796) -> (23.1897, 21.3317)
  line L14 (25.4065, 25.8134) -> (-25.4349, 50.9613)
  arc A8 (-25.4349, 50.9613) -> (-27.6517, 46.4796) centre (-26.5433, 48.7204) ccw
  arc A9 (23.1897, 21.3317) -> (25.4065, 25.8134) centre (24.2981, 23.5725) ccw
  line L15 (-26.5433, 73.908) -> (24.2981, 48.7601) construction
  line L16 (-27.6517, 71.6672) -> (23.1897, 46.5192)
  line L17 (25.4065, 51.001) -> (-25.4349, 76.1489)
  arc A10 (-25.4349, 76.1489) -> (-27.6517, 71.6672) centre (-26.5433, 73.908) ccw
  arc A11 (23.1897, 46.5192) -> (25.4065, 51.001) centre (24.2981, 48.7601) ccw
  point P0 (0, 0)
  point P1 (-1.1332, -65.7542)
  point P2 (-7.3989, -37.2073)
  point P3 (-2.5258, -15.0082)
  point P4 (-1.1226, 10.3331)
  point P5 (-1.1226, 36.1465)
  point P6 (-1.1226, 61.3341)
  dimension "d63" = 5
  dimension "d64" = 5
  dimension "d65" = 5
  dimension "d66" = 5
  dimension "d67" = 5
  dimension "d68" = 5
extrude "Extrusion11" cut sketch "Sketch11" against normal blind 5
properties part number "left_side"
